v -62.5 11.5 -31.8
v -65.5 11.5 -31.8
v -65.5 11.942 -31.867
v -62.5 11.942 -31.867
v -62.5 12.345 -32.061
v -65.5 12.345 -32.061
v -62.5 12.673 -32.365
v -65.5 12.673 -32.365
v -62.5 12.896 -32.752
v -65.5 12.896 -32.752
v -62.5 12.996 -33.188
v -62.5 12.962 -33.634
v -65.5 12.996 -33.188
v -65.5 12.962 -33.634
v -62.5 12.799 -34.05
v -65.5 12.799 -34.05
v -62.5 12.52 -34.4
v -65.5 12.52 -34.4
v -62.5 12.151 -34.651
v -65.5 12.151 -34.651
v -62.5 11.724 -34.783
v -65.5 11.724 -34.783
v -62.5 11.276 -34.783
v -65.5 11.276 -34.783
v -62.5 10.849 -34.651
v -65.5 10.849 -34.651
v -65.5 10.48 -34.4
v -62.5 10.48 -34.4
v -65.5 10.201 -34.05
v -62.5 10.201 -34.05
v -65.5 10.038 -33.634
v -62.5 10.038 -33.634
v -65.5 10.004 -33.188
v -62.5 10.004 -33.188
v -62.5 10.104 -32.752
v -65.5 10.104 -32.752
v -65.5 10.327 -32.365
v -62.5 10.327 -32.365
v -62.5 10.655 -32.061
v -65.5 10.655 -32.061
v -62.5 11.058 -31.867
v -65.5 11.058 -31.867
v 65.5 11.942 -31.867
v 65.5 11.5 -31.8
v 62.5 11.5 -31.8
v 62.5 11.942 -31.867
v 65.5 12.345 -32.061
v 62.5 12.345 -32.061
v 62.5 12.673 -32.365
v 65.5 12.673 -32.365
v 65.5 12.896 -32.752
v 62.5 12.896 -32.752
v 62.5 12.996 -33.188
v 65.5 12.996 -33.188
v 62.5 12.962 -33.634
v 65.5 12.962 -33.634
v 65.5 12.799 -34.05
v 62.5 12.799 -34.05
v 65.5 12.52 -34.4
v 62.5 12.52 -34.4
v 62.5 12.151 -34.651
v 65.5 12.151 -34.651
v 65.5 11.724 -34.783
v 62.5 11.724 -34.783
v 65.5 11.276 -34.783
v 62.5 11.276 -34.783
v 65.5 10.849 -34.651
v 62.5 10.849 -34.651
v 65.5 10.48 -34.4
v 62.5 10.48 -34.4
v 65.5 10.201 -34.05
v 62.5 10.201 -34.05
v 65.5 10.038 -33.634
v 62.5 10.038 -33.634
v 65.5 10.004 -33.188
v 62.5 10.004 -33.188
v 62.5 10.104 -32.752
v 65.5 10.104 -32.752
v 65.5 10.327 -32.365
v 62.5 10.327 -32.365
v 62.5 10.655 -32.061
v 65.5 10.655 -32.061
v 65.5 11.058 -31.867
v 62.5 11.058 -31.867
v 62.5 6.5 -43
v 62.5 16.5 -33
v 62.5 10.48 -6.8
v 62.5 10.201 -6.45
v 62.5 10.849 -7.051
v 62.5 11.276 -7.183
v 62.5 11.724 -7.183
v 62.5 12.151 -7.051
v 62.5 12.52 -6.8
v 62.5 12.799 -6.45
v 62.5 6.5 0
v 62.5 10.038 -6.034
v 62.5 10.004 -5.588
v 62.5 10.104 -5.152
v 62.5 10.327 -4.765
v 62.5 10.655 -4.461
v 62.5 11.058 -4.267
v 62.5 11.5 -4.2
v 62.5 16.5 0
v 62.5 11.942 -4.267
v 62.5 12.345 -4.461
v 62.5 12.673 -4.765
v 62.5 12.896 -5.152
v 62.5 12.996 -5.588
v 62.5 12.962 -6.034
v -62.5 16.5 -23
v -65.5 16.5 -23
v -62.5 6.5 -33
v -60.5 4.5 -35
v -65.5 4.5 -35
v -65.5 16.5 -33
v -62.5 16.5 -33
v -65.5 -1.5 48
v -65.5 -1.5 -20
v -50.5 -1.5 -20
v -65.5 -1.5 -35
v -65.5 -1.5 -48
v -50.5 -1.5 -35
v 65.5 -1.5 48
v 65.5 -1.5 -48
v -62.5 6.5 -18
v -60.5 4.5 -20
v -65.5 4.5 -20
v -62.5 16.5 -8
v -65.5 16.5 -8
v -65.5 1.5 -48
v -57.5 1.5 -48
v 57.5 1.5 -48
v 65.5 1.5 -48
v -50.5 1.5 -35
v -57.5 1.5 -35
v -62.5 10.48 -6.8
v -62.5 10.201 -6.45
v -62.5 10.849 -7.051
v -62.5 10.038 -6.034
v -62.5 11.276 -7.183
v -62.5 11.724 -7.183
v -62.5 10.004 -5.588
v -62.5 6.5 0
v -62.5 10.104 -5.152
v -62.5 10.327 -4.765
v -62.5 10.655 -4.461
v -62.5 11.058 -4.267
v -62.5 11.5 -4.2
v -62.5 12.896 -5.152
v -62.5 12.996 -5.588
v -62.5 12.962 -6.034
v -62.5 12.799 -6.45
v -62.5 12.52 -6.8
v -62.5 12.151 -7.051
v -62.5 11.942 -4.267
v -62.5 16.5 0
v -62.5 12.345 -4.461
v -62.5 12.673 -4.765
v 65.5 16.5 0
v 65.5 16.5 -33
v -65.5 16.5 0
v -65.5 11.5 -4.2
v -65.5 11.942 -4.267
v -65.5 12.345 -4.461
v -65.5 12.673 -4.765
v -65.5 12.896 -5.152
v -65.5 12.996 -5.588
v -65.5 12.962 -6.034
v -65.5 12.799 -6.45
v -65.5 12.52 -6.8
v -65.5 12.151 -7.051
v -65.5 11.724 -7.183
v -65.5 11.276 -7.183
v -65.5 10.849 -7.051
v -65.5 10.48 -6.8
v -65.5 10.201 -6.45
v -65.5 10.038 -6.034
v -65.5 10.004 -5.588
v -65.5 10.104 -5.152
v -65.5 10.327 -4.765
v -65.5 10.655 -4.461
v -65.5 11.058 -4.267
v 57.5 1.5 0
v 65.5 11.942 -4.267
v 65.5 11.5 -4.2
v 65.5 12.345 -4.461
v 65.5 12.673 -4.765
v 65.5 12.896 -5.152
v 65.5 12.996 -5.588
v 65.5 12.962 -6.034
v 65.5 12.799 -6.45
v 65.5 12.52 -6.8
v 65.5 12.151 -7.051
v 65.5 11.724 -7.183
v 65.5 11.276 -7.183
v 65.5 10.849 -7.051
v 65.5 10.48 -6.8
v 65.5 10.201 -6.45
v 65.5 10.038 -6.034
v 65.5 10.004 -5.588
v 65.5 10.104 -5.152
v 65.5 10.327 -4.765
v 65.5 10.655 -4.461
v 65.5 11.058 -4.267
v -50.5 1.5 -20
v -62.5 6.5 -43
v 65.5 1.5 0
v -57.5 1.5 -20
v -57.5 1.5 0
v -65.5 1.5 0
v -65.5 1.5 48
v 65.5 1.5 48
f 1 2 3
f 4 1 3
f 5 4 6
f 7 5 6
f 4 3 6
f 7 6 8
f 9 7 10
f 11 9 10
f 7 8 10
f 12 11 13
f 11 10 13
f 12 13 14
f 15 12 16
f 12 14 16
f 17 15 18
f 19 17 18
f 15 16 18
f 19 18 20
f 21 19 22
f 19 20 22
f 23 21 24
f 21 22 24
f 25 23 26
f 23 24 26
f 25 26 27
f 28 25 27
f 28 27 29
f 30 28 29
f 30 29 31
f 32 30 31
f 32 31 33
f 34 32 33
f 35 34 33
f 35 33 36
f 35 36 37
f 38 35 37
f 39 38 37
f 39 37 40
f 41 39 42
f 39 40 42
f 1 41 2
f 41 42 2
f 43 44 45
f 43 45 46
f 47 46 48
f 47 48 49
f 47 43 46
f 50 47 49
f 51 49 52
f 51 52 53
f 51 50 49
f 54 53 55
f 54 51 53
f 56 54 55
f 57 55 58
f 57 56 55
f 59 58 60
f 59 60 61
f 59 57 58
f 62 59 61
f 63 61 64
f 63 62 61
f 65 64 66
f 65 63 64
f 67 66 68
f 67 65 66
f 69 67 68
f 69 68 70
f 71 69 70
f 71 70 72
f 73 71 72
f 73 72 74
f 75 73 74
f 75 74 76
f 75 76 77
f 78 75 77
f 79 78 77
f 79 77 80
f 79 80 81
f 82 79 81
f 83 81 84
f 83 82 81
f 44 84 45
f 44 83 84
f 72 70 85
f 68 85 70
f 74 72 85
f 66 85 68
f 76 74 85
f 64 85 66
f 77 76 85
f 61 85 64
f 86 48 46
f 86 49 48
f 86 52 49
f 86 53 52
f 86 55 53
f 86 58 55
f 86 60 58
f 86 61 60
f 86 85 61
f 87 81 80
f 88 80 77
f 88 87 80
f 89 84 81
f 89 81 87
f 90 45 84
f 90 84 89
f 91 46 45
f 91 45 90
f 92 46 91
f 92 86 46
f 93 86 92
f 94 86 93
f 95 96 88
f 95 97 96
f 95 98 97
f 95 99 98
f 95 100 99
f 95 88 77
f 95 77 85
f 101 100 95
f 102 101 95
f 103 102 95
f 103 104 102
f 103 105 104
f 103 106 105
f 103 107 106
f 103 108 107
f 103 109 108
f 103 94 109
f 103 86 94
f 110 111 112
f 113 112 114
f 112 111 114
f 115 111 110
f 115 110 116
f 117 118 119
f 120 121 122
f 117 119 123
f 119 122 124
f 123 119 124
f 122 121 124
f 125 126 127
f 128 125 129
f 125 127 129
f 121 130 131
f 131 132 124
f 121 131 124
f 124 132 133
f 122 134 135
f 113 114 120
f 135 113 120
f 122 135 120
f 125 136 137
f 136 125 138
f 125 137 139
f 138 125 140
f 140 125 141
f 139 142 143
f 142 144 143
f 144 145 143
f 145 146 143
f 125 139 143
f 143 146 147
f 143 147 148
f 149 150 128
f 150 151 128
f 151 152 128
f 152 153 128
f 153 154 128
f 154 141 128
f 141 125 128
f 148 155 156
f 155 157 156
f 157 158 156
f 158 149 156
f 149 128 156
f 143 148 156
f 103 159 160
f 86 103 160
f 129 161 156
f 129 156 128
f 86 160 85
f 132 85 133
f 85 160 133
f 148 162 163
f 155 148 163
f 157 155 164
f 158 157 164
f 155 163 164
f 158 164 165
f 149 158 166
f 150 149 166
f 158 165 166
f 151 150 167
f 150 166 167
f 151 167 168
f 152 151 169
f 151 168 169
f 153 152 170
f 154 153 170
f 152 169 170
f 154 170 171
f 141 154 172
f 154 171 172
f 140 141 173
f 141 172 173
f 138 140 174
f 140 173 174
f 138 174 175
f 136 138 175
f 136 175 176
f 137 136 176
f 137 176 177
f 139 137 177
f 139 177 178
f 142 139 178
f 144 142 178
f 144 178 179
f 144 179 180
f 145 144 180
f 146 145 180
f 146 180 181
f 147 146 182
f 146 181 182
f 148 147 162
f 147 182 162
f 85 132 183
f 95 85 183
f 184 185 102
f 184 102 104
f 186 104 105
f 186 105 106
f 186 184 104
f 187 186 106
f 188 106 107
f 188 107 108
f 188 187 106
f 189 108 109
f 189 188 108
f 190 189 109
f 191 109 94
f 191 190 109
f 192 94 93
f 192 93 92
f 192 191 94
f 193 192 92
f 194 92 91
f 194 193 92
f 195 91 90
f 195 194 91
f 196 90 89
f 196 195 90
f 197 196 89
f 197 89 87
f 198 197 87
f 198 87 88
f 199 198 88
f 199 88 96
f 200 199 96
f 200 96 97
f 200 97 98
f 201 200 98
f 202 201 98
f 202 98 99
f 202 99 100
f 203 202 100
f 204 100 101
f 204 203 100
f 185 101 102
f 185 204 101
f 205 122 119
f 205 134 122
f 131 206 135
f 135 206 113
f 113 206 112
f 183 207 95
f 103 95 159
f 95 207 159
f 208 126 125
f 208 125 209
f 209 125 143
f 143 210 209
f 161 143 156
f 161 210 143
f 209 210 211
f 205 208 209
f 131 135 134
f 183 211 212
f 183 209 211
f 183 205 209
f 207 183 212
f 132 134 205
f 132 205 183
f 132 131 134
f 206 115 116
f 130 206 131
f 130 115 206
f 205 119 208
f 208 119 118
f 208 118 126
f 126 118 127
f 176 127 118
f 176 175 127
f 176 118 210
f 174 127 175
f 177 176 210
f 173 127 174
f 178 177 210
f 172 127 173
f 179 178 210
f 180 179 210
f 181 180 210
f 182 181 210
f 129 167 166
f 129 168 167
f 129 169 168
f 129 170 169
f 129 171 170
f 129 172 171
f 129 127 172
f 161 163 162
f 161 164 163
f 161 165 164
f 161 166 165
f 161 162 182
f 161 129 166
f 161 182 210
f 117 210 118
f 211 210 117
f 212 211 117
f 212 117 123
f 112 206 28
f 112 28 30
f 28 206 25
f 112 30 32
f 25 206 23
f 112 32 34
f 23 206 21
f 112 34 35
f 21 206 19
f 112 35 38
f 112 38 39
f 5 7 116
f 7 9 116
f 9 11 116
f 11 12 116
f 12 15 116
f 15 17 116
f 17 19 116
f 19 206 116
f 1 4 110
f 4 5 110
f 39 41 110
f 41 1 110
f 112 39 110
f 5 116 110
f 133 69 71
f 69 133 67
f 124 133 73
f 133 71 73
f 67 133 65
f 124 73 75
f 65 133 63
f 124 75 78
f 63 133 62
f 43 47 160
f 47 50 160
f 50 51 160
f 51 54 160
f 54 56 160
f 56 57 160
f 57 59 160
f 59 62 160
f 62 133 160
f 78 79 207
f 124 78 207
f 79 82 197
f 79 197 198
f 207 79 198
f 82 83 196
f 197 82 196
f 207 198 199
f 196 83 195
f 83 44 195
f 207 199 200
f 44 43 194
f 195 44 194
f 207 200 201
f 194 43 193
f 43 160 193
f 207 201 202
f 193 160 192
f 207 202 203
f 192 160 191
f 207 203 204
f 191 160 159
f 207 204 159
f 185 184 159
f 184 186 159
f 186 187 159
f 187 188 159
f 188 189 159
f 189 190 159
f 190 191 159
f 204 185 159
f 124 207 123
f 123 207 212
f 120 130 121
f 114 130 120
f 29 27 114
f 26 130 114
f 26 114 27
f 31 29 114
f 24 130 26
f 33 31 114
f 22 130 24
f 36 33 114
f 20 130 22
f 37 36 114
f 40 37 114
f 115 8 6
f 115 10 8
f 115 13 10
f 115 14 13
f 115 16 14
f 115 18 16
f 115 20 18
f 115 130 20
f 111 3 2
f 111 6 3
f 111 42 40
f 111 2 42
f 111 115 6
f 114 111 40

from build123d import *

# Parameters (mm, degrees)
SKETCH1_W           = 131
SKETCH1_H           = 96
BOSS_EXTRUDE1_DEPTH = 1.5
SKETCH2_R           = 1.5
BOSS_EXTRUDE2_DEPTH = 3
CHAMFER1_SIZE       = 5
CUT_EXTRUDE1_DEPTH  = 15


with BuildPart() as part:
    # Sketch1 → Boss-Extrude1 (new, symmetric)
    with BuildSketch(Plane(origin=(0, 0, 0), x_dir=(1, 0, 0), z_dir=(0, 1, 0))):
        Rectangle(SKETCH1_W, SKETCH1_H)
    extrude(amount=BOSS_EXTRUDE1_DEPTH, both=True)

    # Sketch2 → Boss-Extrude2 (add)
    with BuildSketch(Plane.ZY.offset(65.5)):
        Polygon((-33, 16.5), (-48, 1.5), (0, 1.5), (0, 16.5), align=None)
        with Locations((-33.3, 11.5)):
            Circle(SKETCH2_R, mode=Mode.SUBTRACT)
        with Locations((-5.7, 11.5)):
            Circle(SKETCH2_R, mode=Mode.SUBTRACT)
    boss_extrude2 = extrude(amount=-BOSS_EXTRUDE2_DEPTH)

    # Mirror1: Boss-Extrude2 across plane
    add(boss_extrude2.mirror(Plane(origin=(0, 0, 0), x_dir=(0, 0, 1), z_dir=(1, 0, 0))))

    # Chamfer1
    chamfer1_edges = [part.edges().sort_by_distance(p)[0] for p in [
        (-62.5, 1.5, -24),
        (62.5, 1.5, -24),
    ]]
    chamfer(chamfer1_edges, length=CHAMFER1_SIZE)

    # Sketch3 → Cut-Extrude1 (cut)
    with BuildSketch(Plane.ZY.offset(65.5)):
        Polygon((-20, -1.5), (-20, 4.5), (-8, 16.5), (-20, 16.5), (-23, 16.5), (-35, 4.5), (-35, -1.5), align=None)
    extrude(amount=-CUT_EXTRUDE1_DEPTH, mode=Mode.SUBTRACT)


solid = part.part
